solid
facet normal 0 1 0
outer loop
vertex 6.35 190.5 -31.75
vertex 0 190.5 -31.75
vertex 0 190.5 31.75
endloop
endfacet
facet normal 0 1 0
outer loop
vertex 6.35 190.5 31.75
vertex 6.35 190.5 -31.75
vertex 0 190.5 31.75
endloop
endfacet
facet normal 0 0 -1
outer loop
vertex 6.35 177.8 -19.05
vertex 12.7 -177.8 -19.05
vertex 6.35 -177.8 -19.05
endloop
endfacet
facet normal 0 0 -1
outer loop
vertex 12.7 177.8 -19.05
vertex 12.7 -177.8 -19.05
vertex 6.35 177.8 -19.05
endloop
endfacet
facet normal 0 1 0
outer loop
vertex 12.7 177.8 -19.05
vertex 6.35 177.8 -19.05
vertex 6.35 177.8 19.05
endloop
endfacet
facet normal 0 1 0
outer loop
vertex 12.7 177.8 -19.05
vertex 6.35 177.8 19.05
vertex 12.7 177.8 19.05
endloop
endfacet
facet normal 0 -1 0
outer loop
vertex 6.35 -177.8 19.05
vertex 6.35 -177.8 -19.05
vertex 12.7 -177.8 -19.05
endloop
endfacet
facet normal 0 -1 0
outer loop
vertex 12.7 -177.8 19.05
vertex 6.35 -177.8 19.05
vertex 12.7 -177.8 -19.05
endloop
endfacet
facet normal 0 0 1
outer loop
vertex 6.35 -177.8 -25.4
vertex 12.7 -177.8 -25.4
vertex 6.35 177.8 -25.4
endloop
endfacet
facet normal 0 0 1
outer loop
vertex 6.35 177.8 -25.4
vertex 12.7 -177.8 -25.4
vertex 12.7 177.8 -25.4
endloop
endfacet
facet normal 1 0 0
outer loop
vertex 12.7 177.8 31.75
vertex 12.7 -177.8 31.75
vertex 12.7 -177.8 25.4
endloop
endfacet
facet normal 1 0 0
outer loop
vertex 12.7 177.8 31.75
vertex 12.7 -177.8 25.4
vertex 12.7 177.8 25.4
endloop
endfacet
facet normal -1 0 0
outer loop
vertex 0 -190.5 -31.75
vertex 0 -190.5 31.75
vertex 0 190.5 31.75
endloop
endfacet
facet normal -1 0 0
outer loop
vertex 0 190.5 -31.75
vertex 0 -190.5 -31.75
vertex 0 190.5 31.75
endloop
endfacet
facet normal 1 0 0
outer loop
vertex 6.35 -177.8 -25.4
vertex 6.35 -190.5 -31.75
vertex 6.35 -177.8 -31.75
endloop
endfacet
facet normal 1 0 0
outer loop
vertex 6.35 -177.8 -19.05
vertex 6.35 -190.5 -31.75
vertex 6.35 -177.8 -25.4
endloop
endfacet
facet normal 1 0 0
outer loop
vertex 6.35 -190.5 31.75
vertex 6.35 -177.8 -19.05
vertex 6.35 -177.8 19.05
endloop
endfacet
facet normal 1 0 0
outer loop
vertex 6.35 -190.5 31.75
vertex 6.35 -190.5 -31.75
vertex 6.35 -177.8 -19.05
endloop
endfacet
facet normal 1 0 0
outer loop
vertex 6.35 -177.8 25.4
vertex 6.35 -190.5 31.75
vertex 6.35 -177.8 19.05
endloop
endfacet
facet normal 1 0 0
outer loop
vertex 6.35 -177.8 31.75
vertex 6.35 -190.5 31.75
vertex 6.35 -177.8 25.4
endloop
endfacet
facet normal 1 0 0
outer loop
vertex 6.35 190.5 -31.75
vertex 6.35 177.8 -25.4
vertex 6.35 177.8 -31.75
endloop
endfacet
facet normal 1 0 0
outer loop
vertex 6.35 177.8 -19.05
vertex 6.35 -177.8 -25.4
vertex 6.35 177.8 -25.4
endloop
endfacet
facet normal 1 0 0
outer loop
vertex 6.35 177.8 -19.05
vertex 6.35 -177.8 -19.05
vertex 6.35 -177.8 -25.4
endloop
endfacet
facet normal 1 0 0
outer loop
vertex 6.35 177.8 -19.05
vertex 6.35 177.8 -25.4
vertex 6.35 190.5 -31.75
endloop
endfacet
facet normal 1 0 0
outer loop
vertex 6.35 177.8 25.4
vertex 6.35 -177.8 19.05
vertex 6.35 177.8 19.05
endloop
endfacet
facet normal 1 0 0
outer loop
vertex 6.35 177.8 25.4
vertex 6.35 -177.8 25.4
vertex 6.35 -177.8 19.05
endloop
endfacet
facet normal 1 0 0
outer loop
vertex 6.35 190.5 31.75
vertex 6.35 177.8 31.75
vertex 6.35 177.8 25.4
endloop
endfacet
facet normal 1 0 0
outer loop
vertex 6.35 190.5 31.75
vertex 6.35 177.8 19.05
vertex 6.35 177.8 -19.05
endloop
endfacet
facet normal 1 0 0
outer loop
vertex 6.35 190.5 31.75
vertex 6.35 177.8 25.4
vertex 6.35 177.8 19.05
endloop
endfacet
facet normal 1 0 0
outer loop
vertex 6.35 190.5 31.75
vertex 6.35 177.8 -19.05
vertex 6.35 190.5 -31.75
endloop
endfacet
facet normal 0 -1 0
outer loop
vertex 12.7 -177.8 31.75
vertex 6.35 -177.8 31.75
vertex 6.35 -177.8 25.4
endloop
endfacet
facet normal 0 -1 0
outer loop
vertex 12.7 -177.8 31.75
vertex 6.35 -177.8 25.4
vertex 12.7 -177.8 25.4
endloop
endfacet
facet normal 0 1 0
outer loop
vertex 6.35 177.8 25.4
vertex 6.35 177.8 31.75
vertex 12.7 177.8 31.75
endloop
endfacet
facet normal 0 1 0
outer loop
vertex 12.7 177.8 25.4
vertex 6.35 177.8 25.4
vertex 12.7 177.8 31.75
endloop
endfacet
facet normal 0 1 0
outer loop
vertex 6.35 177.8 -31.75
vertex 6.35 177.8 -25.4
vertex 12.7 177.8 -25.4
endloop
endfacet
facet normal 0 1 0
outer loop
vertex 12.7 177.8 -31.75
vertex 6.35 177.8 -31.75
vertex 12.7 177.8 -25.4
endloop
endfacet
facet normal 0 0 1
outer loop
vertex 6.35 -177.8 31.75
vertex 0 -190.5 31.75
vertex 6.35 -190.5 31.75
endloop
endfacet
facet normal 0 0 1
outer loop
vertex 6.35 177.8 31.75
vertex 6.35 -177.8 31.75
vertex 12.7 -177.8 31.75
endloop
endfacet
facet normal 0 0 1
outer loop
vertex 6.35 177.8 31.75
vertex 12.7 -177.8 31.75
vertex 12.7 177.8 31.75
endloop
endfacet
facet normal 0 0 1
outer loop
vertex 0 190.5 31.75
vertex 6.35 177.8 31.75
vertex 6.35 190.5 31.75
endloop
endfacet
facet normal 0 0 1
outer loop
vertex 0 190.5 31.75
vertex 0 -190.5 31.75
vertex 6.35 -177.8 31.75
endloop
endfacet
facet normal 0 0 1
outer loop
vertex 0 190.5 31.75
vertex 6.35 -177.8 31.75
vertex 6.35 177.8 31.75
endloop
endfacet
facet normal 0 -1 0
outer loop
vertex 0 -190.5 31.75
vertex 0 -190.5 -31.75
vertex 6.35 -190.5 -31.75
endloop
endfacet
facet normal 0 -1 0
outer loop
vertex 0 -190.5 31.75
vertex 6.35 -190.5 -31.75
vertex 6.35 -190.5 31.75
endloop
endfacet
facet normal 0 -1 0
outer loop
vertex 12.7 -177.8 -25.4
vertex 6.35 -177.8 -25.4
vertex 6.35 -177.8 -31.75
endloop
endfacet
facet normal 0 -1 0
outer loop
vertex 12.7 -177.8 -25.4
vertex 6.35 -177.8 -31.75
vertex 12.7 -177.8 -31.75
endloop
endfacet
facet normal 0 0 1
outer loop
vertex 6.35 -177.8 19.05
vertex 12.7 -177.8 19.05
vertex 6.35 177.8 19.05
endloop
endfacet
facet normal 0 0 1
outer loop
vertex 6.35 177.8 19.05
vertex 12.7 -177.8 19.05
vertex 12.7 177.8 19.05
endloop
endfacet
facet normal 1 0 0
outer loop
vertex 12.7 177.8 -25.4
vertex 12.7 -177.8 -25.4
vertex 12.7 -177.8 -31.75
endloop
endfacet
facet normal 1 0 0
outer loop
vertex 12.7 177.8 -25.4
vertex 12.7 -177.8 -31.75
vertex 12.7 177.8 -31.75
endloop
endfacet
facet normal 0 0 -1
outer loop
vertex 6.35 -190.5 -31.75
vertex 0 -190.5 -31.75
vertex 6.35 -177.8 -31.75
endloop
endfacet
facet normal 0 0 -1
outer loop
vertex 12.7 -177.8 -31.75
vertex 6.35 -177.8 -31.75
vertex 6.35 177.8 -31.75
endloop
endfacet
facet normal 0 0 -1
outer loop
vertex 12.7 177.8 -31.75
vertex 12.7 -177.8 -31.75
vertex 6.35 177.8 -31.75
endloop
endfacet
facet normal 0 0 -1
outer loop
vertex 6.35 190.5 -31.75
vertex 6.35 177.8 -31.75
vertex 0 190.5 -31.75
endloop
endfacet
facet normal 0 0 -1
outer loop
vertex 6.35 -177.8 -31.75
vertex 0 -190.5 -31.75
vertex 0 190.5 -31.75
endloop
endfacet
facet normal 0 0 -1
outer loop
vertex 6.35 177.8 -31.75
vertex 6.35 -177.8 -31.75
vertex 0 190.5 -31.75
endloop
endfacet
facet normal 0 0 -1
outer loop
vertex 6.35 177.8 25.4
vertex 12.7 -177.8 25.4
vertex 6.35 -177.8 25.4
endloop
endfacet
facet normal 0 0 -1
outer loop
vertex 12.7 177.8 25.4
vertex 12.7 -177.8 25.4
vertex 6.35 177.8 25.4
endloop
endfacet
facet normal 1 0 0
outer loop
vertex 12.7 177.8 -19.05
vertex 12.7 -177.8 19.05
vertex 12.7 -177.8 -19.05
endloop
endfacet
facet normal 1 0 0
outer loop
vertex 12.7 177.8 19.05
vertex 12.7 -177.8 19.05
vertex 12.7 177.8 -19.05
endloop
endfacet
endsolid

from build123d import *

# Parameters (mm, degrees)
F0_W     = 381
F0_H     = 63.5
F1_DEPTH = 12.7
F2_W     = 6.35
F2_H     = 12.7
F3_DEPTH = 63.501
F4_W     = 355.6
F4_H     = 6.35
F5_DEPTH = 6.35


with BuildPart() as f1:
    # F0 (on Right) → F1 (new body)
    with BuildSketch(Plane.YZ):
        Rectangle(F0_W, F0_H)
    extrude(amount=F1_DEPTH)

    # F2 (on face) → F3 (cut, through all)
    with BuildSketch(Plane.XY.offset(31.75)):
        with Locations((9.525, 184.15)):
            Rectangle(F2_W, F2_H)
        with Locations((9.525, -184.15)):
            Rectangle(F2_W, F2_H)
    extrude(amount=-F3_DEPTH, mode=Mode.SUBTRACT)

    # F4 (on face) → F5 (cut)
    with BuildSketch(Plane.YZ.offset(12.7)):
        with Locations((0, 22.225)):
            Rectangle(F4_W, F4_H)
        with Locations((0, -22.225)):
            Rectangle(F4_W, F4_H)
    extrude(amount=-F5_DEPTH, mode=Mode.SUBTRACT)


solid = f1.part
